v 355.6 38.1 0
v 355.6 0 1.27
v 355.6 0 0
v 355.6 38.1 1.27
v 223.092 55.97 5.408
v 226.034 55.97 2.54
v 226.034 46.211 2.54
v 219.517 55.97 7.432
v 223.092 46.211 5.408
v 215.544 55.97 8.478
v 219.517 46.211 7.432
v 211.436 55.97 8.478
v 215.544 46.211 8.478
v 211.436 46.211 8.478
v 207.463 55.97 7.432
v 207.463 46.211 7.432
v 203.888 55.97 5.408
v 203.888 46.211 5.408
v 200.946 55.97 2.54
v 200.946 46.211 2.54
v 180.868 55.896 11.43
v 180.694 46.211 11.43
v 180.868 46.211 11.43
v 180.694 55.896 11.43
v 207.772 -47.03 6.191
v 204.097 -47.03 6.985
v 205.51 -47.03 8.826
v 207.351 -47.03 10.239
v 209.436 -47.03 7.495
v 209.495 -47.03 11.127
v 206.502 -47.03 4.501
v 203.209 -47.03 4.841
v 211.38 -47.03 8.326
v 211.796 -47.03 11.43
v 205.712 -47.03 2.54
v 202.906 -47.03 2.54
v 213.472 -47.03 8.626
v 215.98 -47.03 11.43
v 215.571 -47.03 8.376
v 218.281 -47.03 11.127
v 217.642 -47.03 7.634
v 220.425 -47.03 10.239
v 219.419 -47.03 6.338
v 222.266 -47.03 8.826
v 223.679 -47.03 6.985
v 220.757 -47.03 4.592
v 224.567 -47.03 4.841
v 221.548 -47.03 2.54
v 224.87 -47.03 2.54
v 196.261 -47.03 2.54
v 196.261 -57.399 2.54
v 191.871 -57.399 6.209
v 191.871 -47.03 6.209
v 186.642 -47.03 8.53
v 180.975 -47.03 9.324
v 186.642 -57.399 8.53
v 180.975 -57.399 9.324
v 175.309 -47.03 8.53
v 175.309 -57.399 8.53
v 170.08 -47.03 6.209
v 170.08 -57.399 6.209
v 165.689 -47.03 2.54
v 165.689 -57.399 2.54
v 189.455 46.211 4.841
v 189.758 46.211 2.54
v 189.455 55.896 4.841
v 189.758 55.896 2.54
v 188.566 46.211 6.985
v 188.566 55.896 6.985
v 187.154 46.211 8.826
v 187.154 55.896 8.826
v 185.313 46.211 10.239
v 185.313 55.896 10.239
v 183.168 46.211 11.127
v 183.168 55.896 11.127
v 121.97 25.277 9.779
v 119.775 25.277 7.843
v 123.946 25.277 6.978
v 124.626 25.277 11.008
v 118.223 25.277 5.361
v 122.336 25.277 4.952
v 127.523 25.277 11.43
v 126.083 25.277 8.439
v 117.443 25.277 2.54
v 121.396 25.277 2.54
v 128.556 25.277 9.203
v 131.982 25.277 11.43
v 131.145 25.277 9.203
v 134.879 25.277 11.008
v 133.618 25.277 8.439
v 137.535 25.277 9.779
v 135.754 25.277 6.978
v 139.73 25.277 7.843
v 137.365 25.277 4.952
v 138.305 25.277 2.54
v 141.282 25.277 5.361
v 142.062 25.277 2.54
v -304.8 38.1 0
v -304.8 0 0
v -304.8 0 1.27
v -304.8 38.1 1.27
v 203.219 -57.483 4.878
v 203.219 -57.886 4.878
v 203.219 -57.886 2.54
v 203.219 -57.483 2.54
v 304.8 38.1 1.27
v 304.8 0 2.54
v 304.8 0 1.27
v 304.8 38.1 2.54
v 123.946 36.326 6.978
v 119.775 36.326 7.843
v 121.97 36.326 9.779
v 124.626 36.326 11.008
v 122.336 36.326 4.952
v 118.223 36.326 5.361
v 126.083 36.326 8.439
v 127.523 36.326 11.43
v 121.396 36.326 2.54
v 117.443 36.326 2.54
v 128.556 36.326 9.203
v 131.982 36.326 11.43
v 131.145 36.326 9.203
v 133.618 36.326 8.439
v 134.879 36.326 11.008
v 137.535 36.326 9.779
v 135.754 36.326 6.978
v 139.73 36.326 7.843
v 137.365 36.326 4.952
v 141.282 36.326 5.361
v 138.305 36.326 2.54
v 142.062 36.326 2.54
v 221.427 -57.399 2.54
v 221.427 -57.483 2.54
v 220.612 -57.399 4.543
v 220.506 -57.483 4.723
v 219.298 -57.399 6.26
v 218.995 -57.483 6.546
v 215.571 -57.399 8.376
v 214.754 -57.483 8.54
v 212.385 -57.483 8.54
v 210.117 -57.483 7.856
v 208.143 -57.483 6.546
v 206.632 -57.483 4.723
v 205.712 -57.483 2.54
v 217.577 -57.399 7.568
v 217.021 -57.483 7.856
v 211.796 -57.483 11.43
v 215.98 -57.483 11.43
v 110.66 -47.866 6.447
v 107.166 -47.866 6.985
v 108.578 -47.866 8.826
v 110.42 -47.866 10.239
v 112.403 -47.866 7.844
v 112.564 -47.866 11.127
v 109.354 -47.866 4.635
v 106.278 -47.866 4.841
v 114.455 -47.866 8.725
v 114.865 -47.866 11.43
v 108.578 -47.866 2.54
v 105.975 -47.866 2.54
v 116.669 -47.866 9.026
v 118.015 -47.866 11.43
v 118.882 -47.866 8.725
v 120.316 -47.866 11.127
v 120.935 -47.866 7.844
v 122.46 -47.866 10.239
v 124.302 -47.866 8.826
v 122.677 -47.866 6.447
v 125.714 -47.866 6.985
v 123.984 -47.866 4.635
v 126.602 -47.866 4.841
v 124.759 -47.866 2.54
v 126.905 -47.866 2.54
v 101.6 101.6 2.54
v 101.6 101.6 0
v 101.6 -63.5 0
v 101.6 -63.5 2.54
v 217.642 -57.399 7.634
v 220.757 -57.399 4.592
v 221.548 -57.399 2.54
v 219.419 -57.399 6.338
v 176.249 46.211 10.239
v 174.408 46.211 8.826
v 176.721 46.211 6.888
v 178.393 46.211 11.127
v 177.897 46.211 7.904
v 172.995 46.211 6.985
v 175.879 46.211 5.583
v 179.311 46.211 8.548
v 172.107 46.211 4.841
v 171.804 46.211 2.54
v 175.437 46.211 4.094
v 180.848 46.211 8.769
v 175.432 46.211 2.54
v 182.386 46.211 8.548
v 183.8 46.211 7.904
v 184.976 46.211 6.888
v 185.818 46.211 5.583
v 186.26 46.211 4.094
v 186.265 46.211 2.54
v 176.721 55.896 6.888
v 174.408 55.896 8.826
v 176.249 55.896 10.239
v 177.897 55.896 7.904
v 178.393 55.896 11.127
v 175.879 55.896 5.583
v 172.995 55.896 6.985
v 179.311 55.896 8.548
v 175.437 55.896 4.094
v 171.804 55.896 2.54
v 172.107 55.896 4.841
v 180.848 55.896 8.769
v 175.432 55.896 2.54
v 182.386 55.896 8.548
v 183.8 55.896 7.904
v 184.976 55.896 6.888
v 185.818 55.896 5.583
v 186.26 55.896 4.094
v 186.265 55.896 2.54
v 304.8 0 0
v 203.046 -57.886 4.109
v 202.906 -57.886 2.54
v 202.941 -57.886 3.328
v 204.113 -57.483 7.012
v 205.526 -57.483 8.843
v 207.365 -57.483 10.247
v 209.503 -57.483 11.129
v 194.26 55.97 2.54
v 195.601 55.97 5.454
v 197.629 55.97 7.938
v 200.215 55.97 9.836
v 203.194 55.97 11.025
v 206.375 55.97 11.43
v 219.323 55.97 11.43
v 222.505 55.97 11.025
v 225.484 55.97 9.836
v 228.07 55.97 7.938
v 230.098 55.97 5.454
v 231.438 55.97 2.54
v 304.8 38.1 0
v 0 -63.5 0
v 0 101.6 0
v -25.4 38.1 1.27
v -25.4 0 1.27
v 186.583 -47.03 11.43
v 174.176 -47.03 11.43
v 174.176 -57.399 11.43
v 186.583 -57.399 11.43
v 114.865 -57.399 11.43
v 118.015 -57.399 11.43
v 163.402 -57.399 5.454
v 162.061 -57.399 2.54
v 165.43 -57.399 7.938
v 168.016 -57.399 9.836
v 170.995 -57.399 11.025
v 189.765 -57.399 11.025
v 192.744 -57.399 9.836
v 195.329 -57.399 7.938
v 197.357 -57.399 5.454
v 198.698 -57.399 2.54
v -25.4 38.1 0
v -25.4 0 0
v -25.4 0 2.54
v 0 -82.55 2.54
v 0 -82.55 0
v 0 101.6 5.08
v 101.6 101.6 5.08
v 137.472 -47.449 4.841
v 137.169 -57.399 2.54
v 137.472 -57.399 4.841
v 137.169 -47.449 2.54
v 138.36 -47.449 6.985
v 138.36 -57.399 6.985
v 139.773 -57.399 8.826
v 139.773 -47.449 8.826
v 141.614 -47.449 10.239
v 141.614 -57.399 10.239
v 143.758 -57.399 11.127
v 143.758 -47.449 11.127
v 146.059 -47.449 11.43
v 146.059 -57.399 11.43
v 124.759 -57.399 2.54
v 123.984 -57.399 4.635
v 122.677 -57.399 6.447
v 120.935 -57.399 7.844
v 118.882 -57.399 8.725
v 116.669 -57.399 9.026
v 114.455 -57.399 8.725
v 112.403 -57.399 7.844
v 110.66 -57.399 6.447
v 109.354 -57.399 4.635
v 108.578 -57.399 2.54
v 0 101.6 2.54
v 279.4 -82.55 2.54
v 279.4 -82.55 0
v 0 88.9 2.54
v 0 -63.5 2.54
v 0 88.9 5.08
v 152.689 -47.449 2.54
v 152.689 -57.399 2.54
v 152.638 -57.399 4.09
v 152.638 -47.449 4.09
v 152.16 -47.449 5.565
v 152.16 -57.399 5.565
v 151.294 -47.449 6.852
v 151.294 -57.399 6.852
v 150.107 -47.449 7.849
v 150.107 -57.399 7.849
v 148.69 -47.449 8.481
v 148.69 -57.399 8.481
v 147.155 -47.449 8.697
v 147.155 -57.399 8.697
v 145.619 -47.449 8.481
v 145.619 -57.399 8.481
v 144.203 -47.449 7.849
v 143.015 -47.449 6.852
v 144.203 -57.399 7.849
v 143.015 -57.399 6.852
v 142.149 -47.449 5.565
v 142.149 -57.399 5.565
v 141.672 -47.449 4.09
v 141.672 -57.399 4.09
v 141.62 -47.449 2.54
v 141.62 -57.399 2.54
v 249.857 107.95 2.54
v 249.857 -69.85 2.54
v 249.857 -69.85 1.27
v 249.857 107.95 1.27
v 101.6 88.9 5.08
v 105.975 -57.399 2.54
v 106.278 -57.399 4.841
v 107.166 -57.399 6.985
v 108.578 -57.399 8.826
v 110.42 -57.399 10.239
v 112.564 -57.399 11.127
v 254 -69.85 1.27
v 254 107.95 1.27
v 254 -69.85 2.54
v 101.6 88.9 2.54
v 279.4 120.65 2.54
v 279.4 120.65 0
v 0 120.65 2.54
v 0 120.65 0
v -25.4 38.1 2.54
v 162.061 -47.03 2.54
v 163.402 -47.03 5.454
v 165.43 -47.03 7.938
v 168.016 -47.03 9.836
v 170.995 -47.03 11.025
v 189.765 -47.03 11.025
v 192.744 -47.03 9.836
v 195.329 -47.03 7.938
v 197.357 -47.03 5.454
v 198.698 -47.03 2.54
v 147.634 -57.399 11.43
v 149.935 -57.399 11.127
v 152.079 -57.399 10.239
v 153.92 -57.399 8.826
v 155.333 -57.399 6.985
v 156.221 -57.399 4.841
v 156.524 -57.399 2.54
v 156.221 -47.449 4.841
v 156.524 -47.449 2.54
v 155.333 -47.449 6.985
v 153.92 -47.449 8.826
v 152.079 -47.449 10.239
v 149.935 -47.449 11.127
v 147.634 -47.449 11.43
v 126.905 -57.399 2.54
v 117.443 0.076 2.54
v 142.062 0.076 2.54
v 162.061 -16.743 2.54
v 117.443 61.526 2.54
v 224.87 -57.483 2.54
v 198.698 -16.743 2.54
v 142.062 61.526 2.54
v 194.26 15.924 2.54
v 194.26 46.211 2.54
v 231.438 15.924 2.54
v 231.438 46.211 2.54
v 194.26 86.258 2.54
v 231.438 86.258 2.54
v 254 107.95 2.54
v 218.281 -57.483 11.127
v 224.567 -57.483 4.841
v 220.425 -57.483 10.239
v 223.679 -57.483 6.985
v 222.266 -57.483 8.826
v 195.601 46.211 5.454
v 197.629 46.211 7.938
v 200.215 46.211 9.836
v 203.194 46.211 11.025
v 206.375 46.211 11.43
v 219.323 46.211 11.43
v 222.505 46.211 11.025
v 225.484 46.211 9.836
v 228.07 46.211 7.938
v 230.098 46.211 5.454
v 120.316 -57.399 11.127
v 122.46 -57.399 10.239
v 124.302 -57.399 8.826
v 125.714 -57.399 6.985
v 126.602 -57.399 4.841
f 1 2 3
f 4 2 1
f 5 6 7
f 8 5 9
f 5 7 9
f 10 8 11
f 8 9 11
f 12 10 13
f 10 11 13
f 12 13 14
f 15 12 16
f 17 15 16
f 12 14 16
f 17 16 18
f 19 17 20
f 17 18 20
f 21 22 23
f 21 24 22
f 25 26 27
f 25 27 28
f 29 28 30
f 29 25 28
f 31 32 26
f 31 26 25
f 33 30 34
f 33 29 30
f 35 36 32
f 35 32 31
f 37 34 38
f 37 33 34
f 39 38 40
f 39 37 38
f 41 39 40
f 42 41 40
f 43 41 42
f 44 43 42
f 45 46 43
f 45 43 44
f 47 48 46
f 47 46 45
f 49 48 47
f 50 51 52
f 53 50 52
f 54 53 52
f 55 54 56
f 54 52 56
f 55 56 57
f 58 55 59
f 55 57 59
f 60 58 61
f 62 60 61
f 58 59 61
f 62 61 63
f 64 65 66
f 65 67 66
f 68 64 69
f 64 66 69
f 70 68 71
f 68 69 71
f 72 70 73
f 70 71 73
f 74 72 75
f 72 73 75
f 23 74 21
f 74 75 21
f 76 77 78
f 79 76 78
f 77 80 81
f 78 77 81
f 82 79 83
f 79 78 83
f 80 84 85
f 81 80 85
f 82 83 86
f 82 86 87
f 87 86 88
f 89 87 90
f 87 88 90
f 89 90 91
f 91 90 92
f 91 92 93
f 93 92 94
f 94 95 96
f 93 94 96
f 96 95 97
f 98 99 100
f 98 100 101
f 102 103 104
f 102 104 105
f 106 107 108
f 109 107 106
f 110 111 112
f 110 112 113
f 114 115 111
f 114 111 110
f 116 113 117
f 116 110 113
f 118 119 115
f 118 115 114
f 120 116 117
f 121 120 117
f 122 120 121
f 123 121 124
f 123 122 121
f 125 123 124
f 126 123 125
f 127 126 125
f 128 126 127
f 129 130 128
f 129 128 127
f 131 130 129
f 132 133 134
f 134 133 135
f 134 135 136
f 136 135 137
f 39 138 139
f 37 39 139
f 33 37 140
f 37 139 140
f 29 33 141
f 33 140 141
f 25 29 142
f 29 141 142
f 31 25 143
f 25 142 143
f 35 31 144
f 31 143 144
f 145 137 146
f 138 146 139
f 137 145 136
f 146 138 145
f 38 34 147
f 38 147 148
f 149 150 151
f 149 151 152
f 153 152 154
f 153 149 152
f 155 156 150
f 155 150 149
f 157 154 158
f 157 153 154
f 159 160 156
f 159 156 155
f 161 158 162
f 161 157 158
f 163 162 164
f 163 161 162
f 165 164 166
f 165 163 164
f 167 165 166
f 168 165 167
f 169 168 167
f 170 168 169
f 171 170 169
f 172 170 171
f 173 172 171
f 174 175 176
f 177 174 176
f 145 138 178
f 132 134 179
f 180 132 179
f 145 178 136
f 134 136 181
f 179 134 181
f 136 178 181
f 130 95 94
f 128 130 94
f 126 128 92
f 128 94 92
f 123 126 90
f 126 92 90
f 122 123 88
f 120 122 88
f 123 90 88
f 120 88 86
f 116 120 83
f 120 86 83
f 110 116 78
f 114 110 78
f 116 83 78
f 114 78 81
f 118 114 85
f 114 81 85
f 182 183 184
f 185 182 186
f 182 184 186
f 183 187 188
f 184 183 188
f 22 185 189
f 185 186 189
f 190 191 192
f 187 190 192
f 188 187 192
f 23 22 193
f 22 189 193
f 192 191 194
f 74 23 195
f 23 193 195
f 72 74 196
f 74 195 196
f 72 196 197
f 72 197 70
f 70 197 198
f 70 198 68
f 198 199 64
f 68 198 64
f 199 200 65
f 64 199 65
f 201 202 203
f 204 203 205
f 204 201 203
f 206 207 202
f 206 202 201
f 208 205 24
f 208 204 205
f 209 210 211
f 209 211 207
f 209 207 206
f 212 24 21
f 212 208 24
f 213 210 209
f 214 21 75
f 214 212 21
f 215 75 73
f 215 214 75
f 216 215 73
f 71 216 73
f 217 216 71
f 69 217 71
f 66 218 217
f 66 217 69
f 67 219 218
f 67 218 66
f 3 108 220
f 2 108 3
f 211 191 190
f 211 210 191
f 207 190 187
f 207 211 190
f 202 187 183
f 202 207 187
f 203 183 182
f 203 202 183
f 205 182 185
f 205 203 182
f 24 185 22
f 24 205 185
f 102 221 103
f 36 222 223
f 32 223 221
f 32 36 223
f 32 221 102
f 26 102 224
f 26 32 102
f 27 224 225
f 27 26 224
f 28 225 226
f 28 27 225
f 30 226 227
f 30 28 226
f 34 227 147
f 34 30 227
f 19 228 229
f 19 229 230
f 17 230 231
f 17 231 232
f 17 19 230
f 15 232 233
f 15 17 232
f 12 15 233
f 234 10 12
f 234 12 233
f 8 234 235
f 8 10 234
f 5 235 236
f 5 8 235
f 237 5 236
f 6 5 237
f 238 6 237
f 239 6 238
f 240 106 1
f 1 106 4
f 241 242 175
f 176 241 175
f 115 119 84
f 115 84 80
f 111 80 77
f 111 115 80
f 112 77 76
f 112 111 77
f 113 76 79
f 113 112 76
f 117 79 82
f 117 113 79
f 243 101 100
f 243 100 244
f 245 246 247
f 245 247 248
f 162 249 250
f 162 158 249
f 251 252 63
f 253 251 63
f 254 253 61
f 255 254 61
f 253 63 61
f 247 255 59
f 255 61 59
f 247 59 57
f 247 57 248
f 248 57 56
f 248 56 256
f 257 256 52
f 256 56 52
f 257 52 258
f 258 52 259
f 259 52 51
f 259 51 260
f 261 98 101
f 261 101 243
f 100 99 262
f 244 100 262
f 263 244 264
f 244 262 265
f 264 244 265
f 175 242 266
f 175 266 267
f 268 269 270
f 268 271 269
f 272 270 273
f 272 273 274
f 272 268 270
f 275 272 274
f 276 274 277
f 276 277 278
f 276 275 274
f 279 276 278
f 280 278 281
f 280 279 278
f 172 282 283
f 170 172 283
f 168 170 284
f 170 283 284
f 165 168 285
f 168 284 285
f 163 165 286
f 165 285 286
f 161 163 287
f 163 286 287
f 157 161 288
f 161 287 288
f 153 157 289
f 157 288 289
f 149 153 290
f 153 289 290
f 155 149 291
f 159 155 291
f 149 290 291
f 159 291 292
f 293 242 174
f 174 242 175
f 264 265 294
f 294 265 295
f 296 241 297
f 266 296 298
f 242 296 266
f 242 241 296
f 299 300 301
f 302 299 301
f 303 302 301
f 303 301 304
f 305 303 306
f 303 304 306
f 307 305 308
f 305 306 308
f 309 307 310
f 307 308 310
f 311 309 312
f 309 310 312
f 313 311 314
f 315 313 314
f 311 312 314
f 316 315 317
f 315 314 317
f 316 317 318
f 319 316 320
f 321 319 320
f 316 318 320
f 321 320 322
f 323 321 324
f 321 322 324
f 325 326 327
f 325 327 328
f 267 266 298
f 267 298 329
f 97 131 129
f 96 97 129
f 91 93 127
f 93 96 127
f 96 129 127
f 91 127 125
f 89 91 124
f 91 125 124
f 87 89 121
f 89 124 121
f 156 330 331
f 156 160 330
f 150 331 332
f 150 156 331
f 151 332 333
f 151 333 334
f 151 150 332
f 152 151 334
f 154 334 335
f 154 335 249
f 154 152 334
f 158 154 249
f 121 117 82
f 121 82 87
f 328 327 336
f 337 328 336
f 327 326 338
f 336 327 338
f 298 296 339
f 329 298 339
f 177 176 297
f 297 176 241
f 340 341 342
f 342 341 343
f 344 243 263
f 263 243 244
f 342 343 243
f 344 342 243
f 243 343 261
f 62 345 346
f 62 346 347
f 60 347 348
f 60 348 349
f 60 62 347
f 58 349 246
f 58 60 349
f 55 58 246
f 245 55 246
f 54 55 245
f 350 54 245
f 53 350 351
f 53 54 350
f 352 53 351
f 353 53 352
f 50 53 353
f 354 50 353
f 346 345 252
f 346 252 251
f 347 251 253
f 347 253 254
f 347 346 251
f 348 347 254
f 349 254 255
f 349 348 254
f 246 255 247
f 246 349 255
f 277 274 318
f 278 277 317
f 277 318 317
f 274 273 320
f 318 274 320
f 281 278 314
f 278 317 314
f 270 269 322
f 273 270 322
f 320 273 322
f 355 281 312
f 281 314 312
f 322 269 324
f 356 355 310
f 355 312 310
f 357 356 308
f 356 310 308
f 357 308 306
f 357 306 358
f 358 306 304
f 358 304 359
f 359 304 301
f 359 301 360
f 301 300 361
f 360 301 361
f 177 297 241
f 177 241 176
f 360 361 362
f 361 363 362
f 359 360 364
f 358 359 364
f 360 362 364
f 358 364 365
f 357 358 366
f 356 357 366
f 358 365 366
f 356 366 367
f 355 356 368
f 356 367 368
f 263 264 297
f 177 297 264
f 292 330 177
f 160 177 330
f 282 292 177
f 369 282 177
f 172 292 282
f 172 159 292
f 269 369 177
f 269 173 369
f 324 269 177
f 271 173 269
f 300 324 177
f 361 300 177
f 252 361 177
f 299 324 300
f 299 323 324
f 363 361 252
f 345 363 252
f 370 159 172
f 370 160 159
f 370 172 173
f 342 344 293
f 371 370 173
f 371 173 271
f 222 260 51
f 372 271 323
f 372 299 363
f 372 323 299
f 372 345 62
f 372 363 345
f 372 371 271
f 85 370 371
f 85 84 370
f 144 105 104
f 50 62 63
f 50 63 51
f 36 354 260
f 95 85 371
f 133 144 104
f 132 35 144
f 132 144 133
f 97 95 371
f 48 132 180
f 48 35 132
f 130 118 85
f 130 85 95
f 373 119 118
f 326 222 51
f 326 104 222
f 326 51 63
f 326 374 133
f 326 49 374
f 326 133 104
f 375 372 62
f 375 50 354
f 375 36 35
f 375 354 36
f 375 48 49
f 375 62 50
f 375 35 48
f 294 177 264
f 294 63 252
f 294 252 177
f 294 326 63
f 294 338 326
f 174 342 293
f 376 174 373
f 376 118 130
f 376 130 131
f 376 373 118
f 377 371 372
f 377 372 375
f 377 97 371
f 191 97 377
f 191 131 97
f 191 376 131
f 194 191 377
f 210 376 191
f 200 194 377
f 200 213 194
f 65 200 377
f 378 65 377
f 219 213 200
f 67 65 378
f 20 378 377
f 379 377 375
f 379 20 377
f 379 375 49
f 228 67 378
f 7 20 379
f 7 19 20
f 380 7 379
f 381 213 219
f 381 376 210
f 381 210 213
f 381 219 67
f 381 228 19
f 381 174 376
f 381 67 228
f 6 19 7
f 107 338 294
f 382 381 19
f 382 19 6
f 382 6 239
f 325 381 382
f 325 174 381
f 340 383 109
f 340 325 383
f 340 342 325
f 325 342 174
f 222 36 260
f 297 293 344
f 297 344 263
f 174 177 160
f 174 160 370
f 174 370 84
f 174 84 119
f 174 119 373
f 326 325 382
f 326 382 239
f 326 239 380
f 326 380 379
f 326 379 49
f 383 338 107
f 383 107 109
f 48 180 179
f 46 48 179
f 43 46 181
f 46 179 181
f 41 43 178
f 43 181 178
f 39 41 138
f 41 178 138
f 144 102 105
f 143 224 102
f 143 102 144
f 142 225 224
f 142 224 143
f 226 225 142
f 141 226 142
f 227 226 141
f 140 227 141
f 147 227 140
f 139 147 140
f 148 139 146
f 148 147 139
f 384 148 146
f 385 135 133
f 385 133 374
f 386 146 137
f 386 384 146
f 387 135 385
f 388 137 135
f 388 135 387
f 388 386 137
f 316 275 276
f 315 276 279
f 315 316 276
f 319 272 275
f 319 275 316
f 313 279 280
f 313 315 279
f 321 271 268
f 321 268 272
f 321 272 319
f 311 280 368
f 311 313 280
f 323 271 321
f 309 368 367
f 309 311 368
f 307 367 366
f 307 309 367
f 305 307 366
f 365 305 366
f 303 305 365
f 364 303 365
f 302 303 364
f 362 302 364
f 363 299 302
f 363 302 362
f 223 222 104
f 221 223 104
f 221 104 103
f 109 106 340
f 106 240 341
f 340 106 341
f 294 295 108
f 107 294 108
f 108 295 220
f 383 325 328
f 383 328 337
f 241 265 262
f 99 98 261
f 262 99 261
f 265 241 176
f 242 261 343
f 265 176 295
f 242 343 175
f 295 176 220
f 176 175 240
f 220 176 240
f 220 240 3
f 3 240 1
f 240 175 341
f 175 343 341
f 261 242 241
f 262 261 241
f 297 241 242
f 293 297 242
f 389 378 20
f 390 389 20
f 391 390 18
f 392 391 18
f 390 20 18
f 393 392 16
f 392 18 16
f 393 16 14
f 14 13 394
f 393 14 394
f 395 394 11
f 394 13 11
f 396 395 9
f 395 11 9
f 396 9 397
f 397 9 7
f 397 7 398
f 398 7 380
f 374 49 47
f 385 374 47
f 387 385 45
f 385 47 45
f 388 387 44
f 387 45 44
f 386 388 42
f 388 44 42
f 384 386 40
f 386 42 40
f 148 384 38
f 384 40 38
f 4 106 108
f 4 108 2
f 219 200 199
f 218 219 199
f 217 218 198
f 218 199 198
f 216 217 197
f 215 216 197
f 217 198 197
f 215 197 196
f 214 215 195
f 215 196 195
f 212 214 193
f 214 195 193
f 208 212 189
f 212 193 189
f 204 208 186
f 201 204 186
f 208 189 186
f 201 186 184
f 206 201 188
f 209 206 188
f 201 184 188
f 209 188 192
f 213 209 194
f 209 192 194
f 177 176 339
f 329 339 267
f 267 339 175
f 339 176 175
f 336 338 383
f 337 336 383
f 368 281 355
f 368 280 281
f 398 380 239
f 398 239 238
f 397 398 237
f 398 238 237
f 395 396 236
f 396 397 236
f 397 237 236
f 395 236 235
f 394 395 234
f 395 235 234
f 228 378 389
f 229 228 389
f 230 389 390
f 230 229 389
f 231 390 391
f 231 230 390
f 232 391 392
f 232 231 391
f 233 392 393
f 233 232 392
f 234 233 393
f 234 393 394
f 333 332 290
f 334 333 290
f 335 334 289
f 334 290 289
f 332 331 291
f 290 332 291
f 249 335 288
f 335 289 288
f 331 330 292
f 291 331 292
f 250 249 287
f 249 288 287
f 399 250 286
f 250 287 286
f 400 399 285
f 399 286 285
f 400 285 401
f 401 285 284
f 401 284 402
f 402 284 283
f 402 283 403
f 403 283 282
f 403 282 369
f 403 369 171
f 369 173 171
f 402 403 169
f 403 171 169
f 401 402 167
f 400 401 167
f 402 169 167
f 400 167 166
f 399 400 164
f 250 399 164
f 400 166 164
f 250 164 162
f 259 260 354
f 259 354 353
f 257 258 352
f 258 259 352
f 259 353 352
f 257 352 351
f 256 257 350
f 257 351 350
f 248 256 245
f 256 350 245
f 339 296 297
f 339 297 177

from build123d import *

# Parameters (mm, degrees)
F0_W         = 279.4
F0_H         = 38.1
F1_DEPTH     = 1.27
F3_DEPTH     = 2.54
F4_W         = 101.6
F4_H         = 165.1
F5_DEPTH     = 2.54
F6_W         = 101.6
F6_H         = 12.7
F7_DEPTH     = 2.54
F8_W         = 50.8
F8_H         = 38.1
F9_DEPTH     = 2.54
F10_W        = 50.8
F10_H        = 38.1
F11_DEPTH    = 1.27
F12_W        = 4.1427978277
F12_H        = 177.8
F13_DEPTH    = 1.27
F15_W        = 20.9306627512
F15_H        = 9.5325633883
F15_W_2      = 19.3549990654
F15_H_2      = 9.9495388567
F15_W_3      = 24.6197581291
F15_H_3      = 11.048823595
F15_W_4      = 36.6368442774
F15_H_4      = 10.3682503104
F15_W_5      = 17.9531574249
F15_H_5      = 9.6851810813
F15_W_6      = 37.1780246496
F15_H_6      = 9.7587406635
F15_W_7      = 21.9638049603
F15_H_7      = 10.8560696244
F16_DEPTH    = 8.89
F17_R        = 8.88999
F18_T1_DEPTH = 61.4503860708
F19_T1_DEPTH = 70.9433896004
F19_T3_DEPTH = 70.3338799535
F21_DEPTH    = 25.4
F23_DEPTH    = 25.4
F25_DEPTH    = 25.4
F26_W        = 21.9202637672
F26_H        = 0.403650105
F27_DEPTH    = 8.89
F29_DEPTH    = 25.4


# Not quite as in the source:
# - a fillet or chamfer that OpenCascade refuses, or shapes differently, is made with other operations: its cross-section is extruded or revolved along the edge and cut away or added
# - a fillet or chamfer is up to 0.001 mm smaller than in the source, because OpenCascade refuses the exact size


with BuildPart() as f1:
    # F0 (on Top) → F1 (new body)
    with BuildSketch(Plane.XY):
        with Locations((-165.1, 19.05)):
            Rectangle(F0_W, F0_H)
    extrude(amount=F1_DEPTH)

    # F2 (on Top) → F3 (join)
    with BuildSketch(Plane.XY):
        Polygon((0, -63.5), (0, 0), (0, 38.1), (0, 101.6), (0, 120.65), (-25.4, 38.1), (-25.4, 0), (0, -82.55), align=None)
        Polygon((101.6, -63.5), (0, -63.5), (0, -82.55), (279.4, -82.55), (279.4, 120.65), (0, 120.65), (0, 101.6), (101.6, 101.6), align=None)
        Polygon((279.4, 120.65), (279.4, -82.55), (304.8, 0), (304.8, 38.1), align=None)
    extrude(amount=F3_DEPTH)

    # F8 (on face) → F9 (join)
    with BuildSketch(Plane.XY.offset(2.54)):
        with Locations((330.2, 19.05)):
            Rectangle(F8_W, F8_H)
    extrude(amount=-F9_DEPTH)

    # F10 (on face) → F11 (cut)
    with BuildSketch(Plane.XY.offset(2.54)):
        with Locations((330.2, 19.05)):
            Rectangle(F10_W, F10_H)
    extrude(amount=-F11_DEPTH, mode=Mode.SUBTRACT)

    # F12 (on face) → F13 (cut)
    with BuildSketch(Plane.XY.offset(2.54)):
        with Locations((251.9286010861, 19.05)):
            Rectangle(F12_W, F12_H)
    extrude(amount=-F13_DEPTH, mode=Mode.SUBTRACT)

    # F15 (on face) → F16 (join)
    with BuildSketch(Plane.XY.offset(2.54)):
        with Locations((116.4400056005, -52.6323951781)):
            Rectangle(F15_W, F15_H)
        with Locations((146.8468159437, -52.4239074439)):
            Rectangle(F15_W_2, F15_H_2)
        with Locations((129.7524869442, 30.801191926)):
            Rectangle(F15_W_3, F15_H_3)
        with Locations((180.3798153996, -52.214551717)):
            Rectangle(F15_W_4, F15_H_4)
        with Locations((180.7809472084, 51.05381459)):
            Rectangle(F15_W_5, F15_H_5)
        with Locations((212.849445641, 51.0905943811)):
            Rectangle(F15_W_6, F15_H_6)
        with Locations((213.8880491257, -52.458461374)):
            Rectangle(F15_W_7, F15_H_7)
    extrude(amount=F16_DEPTH)

    # F17 (radius 8.89 in the source; OpenCascade refuses exactly that, so slightly less here)
    f17_edges = [f1.edges().sort_by_distance(p)[0] for p in [
        (105.974674, -52.632395, 11.43),
        (126.905337, -52.632395, 11.43),
        (137.169316, -52.423907, 11.43),
        (156.524315, -52.423907, 11.43),
        (202.906147, -52.458461, 11.43),
        (224.869952, -52.458461, 11.43),
        (189.757526, 51.053815, 11.43),
        (171.804368, 51.053815, 11.43),
    ]]
    fillet(f17_edges, radius=F17_R)

    # F18: fillet of radius 10.16 on 2 edges, made by hand

    # F18_s2 → F18_t1 (cut)
    with BuildSketch(Plane.XZ.offset(-61.5263849614)):
        with BuildLine():
            ThreePointArc((117.4426078796, 2.54), (120.8027120447, 8.89), (127.5229203748, 11.43))
            Line((127.5229203748, 11.43), (117.4426078796, 11.43))
            Line((117.4426078796, 11.43), (117.4426078796, 2.54))
        make_face()
        with BuildLine():
            ThreePointArc((142.0623660088, 2.54), (138.7022618437, 8.89), (131.9820535136, 11.43))
            Line((131.9820535136, 11.43), (142.0623660088, 11.43))
            Line((142.0623660088, 11.43), (142.0623660088, 2.54))
        make_face()
    extrude(amount=F18_T1_DEPTH, mode=Mode.SUBTRACT)

    # F19: fillet of radius 12.7 on 4 edges, made by hand

    # F19_s2 → F19_t1 (cut)
    with BuildSketch(Plane.XZ.offset(16.7428569168)):
        with BuildLine():
            ThreePointArc((162.061393261, 2.54), (166.6629997944, 8.9690673403), (174.176421119, 11.43))
            Line((174.176421119, 11.43), (162.061393261, 11.43))
            Line((162.061393261, 11.43), (162.061393261, 2.54))
        make_face()
        with BuildLine():
            ThreePointArc((198.6982375383, 2.54), (194.0966310049, 8.9690673403), (186.5832096803, 11.43))
            Line((186.5832096803, 11.43), (198.6982375383, 11.43))
            Line((198.6982375383, 11.43), (198.6982375383, 2.54))
        make_face()
    extrude(amount=F19_T1_DEPTH, mode=Mode.SUBTRACT)

    # F19_s4 → F19_t3 (cut)
    with BuildSketch(Plane.XZ.offset(-86.2575343578)):
        with BuildLine():
            ThreePointArc((194.2604333162, 2.54), (198.8620398497, 8.9690673403), (206.3754611742, 11.43))
            Line((206.3754611742, 11.43), (194.2604333162, 11.43))
            Line((194.2604333162, 11.43), (194.2604333162, 2.54))
        make_face()
        with BuildLine():
            ThreePointArc((231.4384579659, 2.54), (226.8368514324, 8.9690673403), (219.3234301079, 11.43))
            Line((219.3234301079, 11.43), (231.4384579659, 11.43))
            Line((231.4384579659, 11.43), (231.4384579659, 2.54))
        make_face()
    extrude(amount=F19_T3_DEPTH, mode=Mode.SUBTRACT)

    # F20 (on face) → F21 (cut)
    with BuildSketch(Plane.XZ.offset(-25.2767801285)):
        with BuildLine():
            Line((121.3961169124, 2.54), (138.3046656847, 2.54))
            ThreePointArc((138.3046656847, 2.54), (129.8503912985, 9.3004488884), (121.3961169124, 2.54))
        make_face()
    extrude(amount=-F21_DEPTH, mode=Mode.SUBTRACT)

    # F22 (on face) → F23 (cut)
    with BuildSketch(Plane.XZ.offset(-46.2112240493)):
        with BuildLine():
            Line((175.4323393106, 2.54), (186.2645745277, 2.54))
            ThreePointArc((186.2645745277, 2.54), (180.8484569192, 8.7688172062), (175.4323393106, 2.54))
        make_face()
        with BuildLine():
            Line((200.9464204311, 2.54), (226.0337024927, 2.54))
            ThreePointArc((226.0337024927, 2.54), (213.4900614619, 8.6103858863), (200.9464204311, 2.54))
        make_face()
    extrude(amount=-F23_DEPTH, mode=Mode.SUBTRACT)

    # F24 (on face) → F25 (cut)
    with BuildSketch(Plane.XZ.offset(57.3986768723)):
        with BuildLine():
            Line((108.5784949401, 2.54), (124.7587874532, 2.54))
            ThreePointArc((124.7587874532, 2.54), (116.6686411966, 9.025935128), (108.5784949401, 2.54))
        make_face()
        with BuildLine():
            Line((141.620144248, 2.54), (152.6894122362, 2.54))
            ThreePointArc((152.6894122362, 2.54), (147.1547782421, 8.6968366243), (141.620144248, 2.54))
        make_face()
        with BuildLine():
            Line((165.6893789768, 2.54), (196.2613910437, 2.54))
            ThreePointArc((196.2613910437, 2.54), (180.9753850102, 9.3243519976), (165.6893789768, 2.54))
        make_face()
        with BuildLine():
            Line((206.5167725086, 2.54), (221.5484082699, 2.54))
            ThreePointArc((221.5484082699, 2.54), (214.0325903893, 8.531034918), (206.5167725086, 2.54))
        make_face()
    extrude(amount=-F25_DEPTH, mode=Mode.SUBTRACT)

    # F26 (on face) → F27 (cut)
    with BuildSketch(Plane.XY.offset(11.43)):
        with Locations((214.1792923212, -57.6846711338)):
            Rectangle(F26_W, F26_H)
    extrude(amount=-F27_DEPTH, mode=Mode.SUBTRACT)

    # F28 (on face) → F29 (cut)
    with BuildSketch(Plane.XZ.offset(57.4828460813)):
        with BuildLine():
            Line((205.711632967, 2.54), (221.426859498, 2.54))
            ThreePointArc((221.426859498, 2.54), (213.5692462325, 8.6267545228), (205.711632967, 2.54))
        make_face()
    extrude(amount=-F29_DEPTH, mode=Mode.SUBTRACT)


with BuildPart() as f5:
    # F4 (on face) → F5 (new body)
    with BuildSketch(Plane.XY.offset(2.54)):
        with Locations((50.8, 19.05)):
            Rectangle(F4_W, F4_H)
    extrude(amount=-F5_DEPTH)

    # F6 (on face) → F7 (join)
    with BuildSketch(Plane.XY.offset(2.54)):
        with Locations((50.8, 95.25)):
            Rectangle(F6_W, F6_H)
    extrude(amount=F7_DEPTH)


solid = Compound([f1.part, f5.part])
